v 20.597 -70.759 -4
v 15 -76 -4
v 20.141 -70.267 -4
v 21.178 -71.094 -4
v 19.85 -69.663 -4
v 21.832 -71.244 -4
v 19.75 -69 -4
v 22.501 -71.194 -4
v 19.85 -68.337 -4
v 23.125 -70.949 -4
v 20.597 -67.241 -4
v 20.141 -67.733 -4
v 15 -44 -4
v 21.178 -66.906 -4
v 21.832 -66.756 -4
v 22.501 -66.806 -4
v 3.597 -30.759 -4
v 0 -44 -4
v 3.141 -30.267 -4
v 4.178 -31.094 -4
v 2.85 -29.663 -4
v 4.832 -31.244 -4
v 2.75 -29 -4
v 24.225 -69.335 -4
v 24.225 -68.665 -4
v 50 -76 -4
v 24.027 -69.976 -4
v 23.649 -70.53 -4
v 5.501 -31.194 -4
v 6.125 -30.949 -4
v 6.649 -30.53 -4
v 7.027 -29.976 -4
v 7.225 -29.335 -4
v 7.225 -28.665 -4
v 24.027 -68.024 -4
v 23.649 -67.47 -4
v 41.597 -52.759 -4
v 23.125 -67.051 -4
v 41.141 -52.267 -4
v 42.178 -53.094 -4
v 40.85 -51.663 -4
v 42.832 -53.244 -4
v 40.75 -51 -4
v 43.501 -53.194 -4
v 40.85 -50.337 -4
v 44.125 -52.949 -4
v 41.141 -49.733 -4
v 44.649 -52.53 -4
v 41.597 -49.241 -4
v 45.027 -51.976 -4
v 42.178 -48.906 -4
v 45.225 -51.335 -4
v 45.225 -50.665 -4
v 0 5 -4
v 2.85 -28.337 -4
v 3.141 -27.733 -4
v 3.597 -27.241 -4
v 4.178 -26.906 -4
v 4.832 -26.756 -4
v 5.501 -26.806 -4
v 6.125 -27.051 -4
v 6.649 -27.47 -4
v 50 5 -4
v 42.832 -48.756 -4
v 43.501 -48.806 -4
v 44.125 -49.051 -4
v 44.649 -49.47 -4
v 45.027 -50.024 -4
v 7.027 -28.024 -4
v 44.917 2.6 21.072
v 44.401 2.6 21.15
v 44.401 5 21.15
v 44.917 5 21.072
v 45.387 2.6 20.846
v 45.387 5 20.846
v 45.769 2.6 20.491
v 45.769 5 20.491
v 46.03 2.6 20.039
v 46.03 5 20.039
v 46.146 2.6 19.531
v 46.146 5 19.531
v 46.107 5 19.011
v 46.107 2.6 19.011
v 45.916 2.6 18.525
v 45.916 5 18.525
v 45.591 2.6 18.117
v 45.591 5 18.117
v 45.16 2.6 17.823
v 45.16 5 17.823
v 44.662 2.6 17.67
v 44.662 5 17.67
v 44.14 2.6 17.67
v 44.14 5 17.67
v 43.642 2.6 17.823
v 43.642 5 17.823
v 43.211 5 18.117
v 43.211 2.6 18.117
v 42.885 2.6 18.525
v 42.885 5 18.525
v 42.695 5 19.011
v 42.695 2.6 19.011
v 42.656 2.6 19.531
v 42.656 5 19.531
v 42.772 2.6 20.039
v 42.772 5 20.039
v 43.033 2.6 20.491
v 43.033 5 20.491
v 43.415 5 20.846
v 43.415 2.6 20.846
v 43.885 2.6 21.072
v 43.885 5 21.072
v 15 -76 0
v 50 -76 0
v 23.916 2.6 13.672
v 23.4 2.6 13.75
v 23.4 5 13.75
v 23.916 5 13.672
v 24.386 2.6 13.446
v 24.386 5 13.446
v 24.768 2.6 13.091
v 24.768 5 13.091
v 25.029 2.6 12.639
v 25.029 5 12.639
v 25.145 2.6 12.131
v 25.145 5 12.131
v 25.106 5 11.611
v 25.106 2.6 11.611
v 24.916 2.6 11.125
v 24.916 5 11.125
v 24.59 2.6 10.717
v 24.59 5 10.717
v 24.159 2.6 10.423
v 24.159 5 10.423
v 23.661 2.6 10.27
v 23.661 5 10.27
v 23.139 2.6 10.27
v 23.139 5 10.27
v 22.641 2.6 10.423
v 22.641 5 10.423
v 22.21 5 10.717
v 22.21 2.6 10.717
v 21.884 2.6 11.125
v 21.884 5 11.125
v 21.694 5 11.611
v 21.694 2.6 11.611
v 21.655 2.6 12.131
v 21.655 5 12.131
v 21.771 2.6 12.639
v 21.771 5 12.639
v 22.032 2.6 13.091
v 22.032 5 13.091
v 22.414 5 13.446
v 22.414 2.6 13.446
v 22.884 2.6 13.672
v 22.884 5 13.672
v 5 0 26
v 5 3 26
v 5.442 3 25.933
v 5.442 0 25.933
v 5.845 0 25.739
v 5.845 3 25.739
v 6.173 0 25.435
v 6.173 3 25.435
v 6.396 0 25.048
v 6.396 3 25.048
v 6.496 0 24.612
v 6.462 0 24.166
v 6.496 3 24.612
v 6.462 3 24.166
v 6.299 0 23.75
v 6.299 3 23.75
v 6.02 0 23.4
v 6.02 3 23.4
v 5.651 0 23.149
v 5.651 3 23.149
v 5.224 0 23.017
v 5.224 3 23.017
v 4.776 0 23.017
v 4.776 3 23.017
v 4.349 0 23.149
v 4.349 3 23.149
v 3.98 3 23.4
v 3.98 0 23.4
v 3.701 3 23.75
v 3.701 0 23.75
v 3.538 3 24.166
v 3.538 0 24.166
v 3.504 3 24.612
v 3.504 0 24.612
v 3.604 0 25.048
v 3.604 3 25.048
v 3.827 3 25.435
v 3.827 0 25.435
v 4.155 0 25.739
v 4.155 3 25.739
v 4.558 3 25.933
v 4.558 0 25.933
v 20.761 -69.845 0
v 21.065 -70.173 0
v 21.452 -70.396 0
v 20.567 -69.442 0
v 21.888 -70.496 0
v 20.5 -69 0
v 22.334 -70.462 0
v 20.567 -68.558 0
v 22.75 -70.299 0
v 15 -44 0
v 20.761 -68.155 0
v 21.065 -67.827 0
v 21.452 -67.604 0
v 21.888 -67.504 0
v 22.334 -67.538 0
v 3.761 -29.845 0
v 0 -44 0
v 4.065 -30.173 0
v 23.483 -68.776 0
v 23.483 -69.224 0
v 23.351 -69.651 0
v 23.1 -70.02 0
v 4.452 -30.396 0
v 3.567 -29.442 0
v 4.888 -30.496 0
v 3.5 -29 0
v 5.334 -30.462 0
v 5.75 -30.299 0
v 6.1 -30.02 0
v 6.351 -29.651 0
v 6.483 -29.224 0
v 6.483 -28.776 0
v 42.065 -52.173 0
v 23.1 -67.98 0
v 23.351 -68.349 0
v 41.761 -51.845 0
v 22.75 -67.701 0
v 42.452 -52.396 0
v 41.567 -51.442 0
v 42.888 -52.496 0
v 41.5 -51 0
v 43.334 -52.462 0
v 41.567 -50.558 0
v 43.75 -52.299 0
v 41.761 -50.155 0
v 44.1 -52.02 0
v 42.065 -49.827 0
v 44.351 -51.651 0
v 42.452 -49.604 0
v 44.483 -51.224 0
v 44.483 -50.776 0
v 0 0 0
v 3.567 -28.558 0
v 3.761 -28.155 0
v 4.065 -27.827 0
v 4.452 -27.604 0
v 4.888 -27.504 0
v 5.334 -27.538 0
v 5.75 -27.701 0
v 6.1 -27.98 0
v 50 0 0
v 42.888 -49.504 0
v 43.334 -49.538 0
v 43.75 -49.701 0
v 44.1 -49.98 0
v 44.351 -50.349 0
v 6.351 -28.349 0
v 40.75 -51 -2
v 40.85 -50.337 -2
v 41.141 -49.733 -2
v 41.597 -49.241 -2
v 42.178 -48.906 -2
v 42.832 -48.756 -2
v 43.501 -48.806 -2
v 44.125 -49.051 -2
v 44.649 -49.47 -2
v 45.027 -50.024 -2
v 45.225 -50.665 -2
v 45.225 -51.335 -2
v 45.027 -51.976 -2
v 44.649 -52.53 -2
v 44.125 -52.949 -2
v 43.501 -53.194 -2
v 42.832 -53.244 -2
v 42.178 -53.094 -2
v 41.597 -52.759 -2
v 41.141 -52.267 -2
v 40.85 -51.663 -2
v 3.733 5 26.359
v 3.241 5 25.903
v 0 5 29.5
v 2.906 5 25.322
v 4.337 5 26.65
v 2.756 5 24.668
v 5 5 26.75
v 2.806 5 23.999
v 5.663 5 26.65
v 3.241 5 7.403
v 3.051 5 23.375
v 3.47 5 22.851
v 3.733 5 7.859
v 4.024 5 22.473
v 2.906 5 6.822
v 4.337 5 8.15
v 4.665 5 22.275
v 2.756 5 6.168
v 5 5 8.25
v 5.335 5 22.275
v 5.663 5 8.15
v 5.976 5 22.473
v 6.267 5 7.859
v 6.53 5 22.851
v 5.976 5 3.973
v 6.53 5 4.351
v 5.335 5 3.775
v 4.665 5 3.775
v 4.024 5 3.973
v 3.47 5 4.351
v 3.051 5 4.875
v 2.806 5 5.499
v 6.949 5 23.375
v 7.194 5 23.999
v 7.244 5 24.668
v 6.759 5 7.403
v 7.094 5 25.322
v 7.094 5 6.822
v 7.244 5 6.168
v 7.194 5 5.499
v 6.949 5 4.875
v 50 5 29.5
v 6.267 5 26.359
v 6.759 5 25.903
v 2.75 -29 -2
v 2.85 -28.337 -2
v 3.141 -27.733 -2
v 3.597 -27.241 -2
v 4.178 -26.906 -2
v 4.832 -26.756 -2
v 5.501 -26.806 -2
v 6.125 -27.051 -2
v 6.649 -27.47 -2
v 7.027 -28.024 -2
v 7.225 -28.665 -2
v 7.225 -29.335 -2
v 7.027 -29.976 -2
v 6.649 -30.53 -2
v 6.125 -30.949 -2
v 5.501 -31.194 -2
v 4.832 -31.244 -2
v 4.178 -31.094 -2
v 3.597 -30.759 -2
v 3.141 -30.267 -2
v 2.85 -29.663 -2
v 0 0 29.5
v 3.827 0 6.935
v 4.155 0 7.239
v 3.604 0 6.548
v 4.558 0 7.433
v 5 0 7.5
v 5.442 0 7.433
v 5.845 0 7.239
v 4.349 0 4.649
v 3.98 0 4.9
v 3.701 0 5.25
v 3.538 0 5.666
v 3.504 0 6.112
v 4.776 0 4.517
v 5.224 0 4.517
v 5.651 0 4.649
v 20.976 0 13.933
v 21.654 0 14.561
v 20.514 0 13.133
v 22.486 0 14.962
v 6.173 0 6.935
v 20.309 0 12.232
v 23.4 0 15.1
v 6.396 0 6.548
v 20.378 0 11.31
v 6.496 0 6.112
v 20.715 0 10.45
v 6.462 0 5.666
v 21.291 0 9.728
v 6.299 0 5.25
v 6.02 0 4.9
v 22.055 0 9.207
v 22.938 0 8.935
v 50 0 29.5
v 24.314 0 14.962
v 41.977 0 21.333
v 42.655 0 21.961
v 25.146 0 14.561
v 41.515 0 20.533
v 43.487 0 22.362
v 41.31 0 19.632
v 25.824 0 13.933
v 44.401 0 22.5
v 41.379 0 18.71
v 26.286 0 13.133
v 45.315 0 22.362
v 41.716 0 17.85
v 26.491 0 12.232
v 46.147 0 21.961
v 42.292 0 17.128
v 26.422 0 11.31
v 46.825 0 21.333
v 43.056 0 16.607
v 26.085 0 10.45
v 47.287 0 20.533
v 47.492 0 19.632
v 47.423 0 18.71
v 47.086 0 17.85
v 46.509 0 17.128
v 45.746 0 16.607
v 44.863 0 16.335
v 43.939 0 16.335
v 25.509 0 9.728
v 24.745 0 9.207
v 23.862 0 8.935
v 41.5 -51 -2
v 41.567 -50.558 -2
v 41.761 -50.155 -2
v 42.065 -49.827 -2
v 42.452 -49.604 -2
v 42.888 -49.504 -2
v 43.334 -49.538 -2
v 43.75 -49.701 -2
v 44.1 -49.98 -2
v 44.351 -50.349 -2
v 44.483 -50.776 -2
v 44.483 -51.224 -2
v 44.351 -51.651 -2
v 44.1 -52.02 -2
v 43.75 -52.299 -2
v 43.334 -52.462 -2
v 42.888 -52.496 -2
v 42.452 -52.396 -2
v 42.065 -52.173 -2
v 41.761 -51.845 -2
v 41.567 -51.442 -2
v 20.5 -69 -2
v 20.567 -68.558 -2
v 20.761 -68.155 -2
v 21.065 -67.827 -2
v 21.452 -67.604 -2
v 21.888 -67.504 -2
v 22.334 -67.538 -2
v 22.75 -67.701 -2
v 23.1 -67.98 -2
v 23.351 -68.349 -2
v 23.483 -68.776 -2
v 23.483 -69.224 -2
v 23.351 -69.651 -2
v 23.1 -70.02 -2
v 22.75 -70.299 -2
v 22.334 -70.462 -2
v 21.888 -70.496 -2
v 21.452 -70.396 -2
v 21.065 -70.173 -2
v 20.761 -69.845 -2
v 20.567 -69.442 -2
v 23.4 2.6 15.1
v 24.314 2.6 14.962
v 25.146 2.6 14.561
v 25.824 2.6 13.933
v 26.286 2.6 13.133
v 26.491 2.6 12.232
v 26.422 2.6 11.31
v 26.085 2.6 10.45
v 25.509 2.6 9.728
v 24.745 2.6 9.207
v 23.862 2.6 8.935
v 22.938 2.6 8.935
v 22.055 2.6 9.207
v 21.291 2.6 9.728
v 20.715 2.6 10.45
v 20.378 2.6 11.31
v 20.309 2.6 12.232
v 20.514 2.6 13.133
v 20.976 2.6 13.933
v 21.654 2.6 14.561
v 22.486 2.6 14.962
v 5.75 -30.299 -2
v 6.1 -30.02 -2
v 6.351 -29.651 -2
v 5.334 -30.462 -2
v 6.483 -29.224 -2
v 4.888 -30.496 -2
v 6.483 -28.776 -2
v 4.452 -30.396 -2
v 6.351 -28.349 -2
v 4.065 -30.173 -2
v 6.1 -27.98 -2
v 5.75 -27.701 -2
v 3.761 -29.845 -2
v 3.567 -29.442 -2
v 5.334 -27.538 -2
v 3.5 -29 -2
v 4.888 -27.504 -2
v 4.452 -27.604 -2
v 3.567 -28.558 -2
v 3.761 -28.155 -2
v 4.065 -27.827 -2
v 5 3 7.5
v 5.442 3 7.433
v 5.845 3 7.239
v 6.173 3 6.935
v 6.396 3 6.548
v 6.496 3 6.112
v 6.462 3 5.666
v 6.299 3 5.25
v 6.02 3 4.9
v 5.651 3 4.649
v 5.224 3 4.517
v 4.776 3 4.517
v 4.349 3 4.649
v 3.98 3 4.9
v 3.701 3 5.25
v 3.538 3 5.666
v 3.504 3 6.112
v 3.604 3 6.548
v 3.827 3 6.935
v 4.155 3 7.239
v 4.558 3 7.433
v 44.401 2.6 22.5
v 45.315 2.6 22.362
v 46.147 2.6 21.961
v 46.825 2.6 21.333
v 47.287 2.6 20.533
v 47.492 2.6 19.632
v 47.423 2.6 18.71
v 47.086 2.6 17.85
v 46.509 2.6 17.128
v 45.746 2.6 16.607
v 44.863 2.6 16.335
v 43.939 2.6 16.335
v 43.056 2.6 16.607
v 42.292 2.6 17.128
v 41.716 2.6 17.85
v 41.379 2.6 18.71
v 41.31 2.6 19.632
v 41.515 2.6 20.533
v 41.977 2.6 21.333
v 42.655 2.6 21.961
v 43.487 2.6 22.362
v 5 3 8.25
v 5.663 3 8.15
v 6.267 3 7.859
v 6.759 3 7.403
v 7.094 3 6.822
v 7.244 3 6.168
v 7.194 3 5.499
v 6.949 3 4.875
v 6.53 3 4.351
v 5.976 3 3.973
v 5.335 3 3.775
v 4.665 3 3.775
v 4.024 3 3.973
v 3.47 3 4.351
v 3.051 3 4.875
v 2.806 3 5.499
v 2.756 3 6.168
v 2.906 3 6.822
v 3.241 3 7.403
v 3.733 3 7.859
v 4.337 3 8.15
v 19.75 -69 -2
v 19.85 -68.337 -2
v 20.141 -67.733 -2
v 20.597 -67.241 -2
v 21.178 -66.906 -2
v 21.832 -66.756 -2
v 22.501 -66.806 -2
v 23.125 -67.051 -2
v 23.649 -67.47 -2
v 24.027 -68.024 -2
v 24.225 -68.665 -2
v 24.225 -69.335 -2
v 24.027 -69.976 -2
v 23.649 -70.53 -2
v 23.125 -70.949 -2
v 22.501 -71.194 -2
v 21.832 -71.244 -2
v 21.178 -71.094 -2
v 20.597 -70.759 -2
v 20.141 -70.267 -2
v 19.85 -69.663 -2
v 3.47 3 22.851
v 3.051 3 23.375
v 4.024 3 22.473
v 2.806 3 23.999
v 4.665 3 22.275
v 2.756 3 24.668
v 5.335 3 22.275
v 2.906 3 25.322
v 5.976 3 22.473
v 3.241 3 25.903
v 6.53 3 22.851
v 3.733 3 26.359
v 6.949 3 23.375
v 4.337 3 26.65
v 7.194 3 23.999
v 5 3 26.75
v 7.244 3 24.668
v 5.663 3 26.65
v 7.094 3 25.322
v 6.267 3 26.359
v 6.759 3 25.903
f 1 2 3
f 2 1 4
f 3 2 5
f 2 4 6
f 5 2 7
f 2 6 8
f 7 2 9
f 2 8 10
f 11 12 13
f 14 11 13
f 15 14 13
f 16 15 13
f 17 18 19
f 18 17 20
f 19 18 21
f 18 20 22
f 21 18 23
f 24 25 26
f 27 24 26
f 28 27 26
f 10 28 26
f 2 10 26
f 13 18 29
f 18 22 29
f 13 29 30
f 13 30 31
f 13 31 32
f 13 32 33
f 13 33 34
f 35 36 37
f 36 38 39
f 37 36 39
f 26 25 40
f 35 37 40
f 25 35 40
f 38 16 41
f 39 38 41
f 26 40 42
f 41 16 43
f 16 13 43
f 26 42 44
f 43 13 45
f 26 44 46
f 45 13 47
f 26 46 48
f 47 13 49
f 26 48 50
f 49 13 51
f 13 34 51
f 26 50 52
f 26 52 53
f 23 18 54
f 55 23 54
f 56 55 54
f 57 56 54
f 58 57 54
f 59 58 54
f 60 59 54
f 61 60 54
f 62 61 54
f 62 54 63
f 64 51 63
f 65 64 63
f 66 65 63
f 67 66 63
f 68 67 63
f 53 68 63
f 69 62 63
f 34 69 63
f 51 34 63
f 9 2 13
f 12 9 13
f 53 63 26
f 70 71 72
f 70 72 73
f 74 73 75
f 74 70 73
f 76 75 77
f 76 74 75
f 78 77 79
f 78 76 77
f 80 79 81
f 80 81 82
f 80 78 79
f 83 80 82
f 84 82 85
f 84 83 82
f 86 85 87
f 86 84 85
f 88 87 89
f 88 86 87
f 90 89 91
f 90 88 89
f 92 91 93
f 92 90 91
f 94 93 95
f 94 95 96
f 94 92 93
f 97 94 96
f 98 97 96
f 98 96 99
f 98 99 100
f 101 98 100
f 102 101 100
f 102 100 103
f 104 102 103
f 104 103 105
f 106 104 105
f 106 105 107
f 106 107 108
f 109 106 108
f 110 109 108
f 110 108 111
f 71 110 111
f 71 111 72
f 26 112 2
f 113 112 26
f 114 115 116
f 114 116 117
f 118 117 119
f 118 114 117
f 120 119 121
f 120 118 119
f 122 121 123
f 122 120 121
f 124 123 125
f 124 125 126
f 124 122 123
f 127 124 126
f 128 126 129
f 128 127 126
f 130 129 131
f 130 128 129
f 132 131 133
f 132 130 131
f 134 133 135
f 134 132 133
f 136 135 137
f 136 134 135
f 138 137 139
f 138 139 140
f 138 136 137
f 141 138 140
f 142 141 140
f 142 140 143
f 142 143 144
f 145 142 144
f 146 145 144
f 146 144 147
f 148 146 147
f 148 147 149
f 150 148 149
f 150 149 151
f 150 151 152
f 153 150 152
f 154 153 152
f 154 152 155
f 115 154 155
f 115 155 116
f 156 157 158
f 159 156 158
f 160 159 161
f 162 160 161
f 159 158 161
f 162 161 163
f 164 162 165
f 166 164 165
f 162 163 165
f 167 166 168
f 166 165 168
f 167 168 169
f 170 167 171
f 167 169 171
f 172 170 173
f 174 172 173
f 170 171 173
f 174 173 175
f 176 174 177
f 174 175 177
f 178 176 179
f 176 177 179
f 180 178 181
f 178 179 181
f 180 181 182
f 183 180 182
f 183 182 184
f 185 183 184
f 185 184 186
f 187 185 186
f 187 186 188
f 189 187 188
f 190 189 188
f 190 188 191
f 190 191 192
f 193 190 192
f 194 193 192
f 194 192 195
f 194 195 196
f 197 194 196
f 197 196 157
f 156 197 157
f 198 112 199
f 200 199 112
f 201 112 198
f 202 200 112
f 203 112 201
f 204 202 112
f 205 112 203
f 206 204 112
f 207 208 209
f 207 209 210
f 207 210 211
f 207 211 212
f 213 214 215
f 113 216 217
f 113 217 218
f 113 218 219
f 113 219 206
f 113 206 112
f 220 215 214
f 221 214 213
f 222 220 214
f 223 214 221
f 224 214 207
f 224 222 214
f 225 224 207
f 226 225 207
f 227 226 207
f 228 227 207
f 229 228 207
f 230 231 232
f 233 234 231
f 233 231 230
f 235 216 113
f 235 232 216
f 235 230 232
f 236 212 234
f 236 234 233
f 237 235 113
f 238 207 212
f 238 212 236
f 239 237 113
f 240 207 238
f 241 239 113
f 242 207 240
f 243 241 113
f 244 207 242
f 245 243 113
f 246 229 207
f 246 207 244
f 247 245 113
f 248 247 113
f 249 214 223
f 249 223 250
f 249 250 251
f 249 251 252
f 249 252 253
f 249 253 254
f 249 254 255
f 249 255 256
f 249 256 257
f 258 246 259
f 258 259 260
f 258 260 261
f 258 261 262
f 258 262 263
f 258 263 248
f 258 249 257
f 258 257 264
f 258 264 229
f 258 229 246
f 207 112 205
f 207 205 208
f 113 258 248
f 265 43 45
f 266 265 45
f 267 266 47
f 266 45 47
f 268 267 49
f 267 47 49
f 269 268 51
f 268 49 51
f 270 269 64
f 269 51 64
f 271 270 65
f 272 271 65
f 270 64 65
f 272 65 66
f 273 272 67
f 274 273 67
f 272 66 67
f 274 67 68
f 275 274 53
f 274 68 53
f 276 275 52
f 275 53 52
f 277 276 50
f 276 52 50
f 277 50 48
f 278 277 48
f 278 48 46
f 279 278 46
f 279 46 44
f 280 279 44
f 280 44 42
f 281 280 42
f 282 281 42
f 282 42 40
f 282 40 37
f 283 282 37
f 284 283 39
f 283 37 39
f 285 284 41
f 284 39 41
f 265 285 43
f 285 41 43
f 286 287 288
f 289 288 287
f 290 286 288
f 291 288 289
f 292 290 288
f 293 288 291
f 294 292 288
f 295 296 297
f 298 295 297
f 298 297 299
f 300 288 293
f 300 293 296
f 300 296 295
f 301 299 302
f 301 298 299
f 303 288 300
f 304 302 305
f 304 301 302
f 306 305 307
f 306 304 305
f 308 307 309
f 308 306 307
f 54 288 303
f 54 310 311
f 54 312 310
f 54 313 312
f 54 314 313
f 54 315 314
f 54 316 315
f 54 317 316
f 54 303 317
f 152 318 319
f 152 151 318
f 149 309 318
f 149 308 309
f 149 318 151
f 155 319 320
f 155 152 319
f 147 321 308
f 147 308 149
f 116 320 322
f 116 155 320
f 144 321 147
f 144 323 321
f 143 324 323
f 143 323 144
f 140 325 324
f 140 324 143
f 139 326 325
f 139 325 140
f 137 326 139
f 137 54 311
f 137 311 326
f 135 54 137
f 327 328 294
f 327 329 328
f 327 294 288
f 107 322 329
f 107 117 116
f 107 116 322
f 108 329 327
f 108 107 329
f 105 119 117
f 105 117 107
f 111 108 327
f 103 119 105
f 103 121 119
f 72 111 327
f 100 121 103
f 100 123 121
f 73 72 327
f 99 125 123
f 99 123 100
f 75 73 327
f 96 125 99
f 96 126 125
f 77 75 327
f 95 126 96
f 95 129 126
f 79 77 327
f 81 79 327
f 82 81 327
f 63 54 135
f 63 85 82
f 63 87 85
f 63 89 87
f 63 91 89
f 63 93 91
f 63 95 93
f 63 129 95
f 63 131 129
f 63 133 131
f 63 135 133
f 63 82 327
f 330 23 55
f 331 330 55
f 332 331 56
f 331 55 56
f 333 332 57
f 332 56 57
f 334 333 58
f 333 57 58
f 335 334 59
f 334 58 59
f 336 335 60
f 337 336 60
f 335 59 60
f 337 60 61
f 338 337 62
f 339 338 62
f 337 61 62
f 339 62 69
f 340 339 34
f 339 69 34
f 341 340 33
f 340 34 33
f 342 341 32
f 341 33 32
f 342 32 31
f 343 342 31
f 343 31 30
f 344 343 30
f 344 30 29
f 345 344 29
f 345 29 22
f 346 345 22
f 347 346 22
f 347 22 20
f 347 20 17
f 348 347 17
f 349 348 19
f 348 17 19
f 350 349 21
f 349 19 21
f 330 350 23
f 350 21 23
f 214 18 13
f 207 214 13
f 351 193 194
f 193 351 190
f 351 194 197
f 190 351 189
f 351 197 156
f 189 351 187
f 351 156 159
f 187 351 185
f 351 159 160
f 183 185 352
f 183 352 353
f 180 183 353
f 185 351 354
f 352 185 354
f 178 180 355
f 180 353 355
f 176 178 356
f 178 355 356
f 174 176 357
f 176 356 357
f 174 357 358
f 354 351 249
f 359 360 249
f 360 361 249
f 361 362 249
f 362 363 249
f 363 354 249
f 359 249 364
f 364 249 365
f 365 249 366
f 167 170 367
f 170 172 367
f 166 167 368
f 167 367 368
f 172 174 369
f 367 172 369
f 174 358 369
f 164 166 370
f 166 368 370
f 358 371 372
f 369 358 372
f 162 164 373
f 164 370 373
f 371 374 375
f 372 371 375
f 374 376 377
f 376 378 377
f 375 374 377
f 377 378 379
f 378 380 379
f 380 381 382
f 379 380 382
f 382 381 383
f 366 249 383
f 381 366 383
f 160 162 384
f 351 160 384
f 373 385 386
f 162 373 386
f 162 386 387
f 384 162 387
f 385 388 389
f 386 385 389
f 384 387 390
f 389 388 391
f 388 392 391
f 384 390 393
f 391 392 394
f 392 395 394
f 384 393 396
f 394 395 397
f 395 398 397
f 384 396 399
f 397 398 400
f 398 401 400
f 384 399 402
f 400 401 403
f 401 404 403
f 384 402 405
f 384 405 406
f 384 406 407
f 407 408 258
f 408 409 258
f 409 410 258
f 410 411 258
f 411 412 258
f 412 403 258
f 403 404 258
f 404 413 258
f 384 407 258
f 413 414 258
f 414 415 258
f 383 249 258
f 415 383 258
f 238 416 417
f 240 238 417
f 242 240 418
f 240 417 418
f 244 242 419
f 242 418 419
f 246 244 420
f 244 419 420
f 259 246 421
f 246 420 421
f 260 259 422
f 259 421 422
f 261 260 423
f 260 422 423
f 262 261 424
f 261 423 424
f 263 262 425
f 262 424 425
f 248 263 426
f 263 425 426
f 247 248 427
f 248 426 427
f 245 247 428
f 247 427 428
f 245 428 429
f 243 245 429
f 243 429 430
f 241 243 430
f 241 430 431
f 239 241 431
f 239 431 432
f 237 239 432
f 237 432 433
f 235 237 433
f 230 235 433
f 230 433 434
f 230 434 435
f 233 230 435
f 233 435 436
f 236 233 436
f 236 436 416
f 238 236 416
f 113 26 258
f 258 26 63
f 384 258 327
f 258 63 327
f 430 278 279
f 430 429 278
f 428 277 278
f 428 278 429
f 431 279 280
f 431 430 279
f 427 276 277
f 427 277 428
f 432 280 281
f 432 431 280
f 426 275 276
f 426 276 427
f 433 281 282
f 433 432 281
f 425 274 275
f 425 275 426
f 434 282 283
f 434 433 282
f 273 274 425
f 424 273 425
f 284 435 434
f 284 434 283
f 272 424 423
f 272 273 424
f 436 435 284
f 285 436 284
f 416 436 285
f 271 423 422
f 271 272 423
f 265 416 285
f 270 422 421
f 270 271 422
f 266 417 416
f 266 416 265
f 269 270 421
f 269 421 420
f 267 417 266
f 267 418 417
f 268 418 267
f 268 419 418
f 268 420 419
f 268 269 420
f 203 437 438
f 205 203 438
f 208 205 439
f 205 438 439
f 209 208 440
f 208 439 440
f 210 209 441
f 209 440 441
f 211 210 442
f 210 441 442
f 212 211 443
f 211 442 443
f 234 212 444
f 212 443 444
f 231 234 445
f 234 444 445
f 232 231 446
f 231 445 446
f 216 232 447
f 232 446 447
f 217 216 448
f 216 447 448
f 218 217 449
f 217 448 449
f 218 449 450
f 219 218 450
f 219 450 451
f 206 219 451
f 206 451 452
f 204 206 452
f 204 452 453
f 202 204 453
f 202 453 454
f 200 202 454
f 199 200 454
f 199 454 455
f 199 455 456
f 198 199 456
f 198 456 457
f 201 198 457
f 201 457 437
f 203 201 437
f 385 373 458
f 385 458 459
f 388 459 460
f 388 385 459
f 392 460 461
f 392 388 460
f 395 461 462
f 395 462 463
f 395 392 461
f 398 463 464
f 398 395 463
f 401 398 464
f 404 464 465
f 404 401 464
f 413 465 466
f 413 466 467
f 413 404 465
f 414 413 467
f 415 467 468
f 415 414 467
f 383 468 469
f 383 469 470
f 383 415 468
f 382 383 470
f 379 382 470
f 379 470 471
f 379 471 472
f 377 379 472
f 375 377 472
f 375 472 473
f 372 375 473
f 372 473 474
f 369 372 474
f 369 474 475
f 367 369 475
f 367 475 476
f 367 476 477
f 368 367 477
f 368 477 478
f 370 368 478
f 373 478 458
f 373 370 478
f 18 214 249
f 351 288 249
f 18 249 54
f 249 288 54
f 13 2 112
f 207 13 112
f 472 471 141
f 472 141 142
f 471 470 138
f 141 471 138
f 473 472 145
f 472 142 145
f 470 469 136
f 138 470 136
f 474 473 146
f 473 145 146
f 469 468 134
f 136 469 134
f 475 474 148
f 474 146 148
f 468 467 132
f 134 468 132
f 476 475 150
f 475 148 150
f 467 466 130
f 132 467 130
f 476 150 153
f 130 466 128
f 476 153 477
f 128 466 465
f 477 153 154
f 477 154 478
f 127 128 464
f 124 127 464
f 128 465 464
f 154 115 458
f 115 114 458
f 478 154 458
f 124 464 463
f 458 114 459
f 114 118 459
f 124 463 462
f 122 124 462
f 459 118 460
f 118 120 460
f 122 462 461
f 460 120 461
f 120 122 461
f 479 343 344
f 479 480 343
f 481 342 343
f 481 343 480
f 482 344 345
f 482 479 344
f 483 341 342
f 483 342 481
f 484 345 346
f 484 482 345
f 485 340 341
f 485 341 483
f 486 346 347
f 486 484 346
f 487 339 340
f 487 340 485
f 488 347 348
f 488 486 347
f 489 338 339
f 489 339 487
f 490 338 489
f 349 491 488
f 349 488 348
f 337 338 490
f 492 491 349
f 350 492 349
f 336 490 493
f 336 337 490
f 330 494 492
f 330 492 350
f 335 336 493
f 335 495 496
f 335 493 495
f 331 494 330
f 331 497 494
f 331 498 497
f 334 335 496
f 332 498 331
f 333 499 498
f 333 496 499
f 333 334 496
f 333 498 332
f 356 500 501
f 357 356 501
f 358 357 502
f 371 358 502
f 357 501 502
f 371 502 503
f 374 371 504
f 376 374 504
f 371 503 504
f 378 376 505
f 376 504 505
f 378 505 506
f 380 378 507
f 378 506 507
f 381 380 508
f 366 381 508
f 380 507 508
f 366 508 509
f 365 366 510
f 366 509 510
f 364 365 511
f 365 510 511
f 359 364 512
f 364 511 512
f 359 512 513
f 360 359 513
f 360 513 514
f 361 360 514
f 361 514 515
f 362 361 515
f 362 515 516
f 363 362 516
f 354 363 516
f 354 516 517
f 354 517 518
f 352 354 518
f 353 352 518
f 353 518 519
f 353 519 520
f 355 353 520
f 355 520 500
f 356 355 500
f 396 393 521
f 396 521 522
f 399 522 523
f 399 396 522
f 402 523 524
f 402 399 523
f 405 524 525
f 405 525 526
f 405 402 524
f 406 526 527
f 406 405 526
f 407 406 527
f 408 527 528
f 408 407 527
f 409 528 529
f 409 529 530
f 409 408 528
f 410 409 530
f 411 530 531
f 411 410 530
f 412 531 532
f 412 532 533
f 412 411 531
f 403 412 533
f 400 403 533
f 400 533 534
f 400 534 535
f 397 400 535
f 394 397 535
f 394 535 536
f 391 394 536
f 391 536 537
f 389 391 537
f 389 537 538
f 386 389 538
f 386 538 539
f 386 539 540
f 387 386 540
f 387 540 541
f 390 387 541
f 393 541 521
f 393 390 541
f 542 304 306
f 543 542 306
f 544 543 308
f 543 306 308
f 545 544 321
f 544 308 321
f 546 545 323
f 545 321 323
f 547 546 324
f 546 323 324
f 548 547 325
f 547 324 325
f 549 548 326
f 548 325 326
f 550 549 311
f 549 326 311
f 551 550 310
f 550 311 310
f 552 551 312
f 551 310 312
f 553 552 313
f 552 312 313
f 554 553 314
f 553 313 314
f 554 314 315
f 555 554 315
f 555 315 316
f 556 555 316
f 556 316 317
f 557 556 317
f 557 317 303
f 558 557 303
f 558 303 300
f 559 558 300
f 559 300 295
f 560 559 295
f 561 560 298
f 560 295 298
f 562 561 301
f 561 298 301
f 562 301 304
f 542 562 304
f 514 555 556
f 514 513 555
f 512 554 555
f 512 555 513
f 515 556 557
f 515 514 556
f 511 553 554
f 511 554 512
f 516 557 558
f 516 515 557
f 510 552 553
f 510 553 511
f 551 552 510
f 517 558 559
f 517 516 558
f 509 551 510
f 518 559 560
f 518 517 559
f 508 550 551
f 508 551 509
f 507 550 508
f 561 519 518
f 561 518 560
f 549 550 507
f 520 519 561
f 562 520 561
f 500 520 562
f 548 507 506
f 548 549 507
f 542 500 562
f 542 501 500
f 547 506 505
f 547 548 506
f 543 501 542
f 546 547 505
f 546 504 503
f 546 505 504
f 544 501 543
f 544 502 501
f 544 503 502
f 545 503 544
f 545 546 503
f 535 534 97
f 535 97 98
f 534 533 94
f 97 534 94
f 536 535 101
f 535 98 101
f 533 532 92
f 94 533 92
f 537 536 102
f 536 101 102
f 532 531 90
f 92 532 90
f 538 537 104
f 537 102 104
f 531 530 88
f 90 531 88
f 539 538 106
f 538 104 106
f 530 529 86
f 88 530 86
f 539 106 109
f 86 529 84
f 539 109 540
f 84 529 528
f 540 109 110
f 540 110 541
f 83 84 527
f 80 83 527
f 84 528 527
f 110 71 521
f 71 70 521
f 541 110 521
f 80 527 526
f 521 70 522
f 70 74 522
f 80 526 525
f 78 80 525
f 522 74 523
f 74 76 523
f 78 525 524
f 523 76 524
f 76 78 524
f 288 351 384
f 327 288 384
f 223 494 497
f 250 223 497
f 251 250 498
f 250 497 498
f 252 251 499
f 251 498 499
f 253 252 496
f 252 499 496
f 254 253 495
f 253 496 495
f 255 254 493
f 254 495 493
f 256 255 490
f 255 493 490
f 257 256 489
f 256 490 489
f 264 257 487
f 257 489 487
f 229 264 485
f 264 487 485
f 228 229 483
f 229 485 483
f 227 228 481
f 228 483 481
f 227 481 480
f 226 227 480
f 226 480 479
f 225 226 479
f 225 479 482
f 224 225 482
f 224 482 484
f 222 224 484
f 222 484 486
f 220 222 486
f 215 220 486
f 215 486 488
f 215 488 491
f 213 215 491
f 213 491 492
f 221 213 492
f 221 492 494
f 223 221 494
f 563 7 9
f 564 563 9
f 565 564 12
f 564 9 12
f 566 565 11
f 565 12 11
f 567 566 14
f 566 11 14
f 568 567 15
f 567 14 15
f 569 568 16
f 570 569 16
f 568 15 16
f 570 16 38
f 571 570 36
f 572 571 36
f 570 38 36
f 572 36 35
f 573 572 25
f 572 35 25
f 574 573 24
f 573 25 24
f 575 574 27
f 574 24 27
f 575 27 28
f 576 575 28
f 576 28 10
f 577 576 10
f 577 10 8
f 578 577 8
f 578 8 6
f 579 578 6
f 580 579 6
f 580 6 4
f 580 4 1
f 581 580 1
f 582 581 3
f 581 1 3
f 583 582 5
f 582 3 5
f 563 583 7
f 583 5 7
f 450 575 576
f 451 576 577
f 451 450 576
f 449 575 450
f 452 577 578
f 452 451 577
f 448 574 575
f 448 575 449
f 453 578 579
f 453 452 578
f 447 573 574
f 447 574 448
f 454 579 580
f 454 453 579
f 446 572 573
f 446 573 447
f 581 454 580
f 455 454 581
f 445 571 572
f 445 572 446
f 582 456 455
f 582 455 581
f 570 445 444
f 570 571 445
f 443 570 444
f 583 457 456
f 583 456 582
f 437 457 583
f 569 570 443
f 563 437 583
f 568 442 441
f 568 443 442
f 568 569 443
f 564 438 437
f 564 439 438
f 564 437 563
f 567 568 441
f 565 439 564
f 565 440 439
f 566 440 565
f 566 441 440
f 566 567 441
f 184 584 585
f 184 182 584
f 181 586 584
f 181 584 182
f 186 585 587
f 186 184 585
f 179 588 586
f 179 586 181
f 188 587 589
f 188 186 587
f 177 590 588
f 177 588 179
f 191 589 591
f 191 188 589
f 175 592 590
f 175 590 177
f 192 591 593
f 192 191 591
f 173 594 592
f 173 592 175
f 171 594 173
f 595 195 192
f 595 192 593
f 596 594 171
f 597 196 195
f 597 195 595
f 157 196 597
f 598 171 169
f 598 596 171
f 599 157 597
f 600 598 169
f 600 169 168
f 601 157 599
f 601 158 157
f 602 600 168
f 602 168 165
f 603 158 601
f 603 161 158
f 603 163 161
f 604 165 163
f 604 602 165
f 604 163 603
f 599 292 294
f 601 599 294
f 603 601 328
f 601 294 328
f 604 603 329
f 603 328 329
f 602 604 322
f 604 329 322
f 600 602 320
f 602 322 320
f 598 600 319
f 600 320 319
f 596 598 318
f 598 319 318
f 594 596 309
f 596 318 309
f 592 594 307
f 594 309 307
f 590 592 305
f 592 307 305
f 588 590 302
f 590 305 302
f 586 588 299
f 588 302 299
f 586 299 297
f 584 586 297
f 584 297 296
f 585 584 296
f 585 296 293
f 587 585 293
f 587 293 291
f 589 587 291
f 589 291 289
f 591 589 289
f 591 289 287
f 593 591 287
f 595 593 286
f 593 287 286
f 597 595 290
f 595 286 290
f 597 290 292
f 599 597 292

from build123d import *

# Parameters (mm, degrees)
SKETCH_1_W          = 50
SKETCH_1_H          = 29.5
SKETCH_1_R          = 1.75
EXTRUDE_1_DEPTH     = 5
SKETCH_1_17_R       = 3.1
CUT_EXTRUDE_1_DEPTH = 2.6
EXTRUDE_START       = 5
SKETCH_1_18_W       = 50
SKETCH_1_18_H       = 4
SKETCH_1_18_W_2     = 15
EXTRUDE_2_DEPTH     = 49
SKETCH_2_R          = 1.5
CUT_EXTRUDE_2_DEPTH = 76.968743573
SKETCH_2_4_R        = 2.25
CUT_EXTRUDE_3_DEPTH = 2
SKETCH_4_R          = 1.5
CUT_EXTRUDE_4_DEPTH = 75.553671942
SKETCH_4_3_R        = 2.25
CUT_EXTRUDE_5_DEPTH = 2
SKETCH_5_W          = 35
SKETCH_5_H          = 4
EXTRUDE_4_DEPTH     = 32
SKETCH_6_R          = 1.5
CUT_EXTRUDE_6_DEPTH = 97.944571792
SKETCH_6_3_R        = 2.25
CUT_EXTRUDE_7_DEPTH = 2


with BuildPart() as part:
    # 草图1 → 凸台-拉伸1 (new body)
    with BuildSketch(Plane(origin=(0, 0, 0), x_dir=(1, 0, 0), z_dir=(0, 1, 0))):
        with Locations((25, -14.75)):
            Rectangle(SKETCH_1_W, SKETCH_1_H)
        with Locations(Location((23.4, -12, 0), (0, 0, 270))):
            Circle(SKETCH_1_R, mode=Mode.SUBTRACT)
        with Locations(Location((44.400952359, -19.4, 0), (0, 0, 270))):
            Circle(SKETCH_1_R, mode=Mode.SUBTRACT)
    extrude(amount=EXTRUDE_1_DEPTH)

    # 草图1<17> → 切除-拉伸1 (cut)
    with BuildSketch(Plane(origin=(0, 0, 0), x_dir=(1, 0, 0), z_dir=(0, 1, 0))):
        with Locations(Location((23.4, -12, 0), (0, 0, 270))):
            Circle(SKETCH_1_17_R)
        with Locations(Location((44.400952359, -19.4, 0), (0, 0, 270))):
            Circle(SKETCH_1_17_R)
    extrude(amount=CUT_EXTRUDE_1_DEPTH, mode=Mode.SUBTRACT)

    # 草图1<18> → 凸台-拉伸2 (add)
    with BuildSketch(Plane(origin=(0, 0, 0), x_dir=(1, 0, 0), z_dir=(0, 1, 0)).offset(EXTRUDE_START)):
        with Locations((25, 2)):
            Rectangle(SKETCH_1_18_W, SKETCH_1_18_H)
        with Locations((7.5, 2)):
            Rectangle(SKETCH_1_18_W_2, SKETCH_1_18_H)
    extrude(amount=-EXTRUDE_2_DEPTH)

    # 草图2 → 切除-拉伸2 (cut, through all)
    with BuildSketch(Plane(origin=(0, 5, 0), x_dir=(1, 0, 0), z_dir=(0, 1, 0))):
        with Locations(Location((5, -24.5, 0), (0, 0, 270))):
            Circle(SKETCH_2_R)
        with Locations(Location((5, -6, 0), (0, 0, 270))):
            Circle(SKETCH_2_R)
    extrude(amount=-CUT_EXTRUDE_2_DEPTH, mode=Mode.SUBTRACT)

    # 草图2<4> → 切除-拉伸3 (cut)
    with BuildSketch(Plane(origin=(0, 5, 0), x_dir=(1, 0, 0), z_dir=(0, 1, 0))):
        with Locations(Location((5, -24.5, 0), (0, 0, 270))):
            Circle(SKETCH_2_4_R)
        with Locations(Location((5, -6, 0), (0, 0, 270))):
            Circle(SKETCH_2_4_R)
    extrude(amount=-CUT_EXTRUDE_3_DEPTH, mode=Mode.SUBTRACT)

    # 草图4 → 切除-拉伸4 (cut, through all)
    with BuildSketch(Plane(origin=(0, 0, -4), x_dir=(-1, 0, 0), z_dir=(0, 0, -1))):
        with Locations((-5, -29)):
            Circle(SKETCH_4_R)
    extrude(amount=-CUT_EXTRUDE_4_DEPTH, mode=Mode.SUBTRACT)

    # 草图4<3> → 切除-拉伸5 (cut)
    with BuildSketch(Plane(origin=(0, 0, -4), x_dir=(-1, 0, 0), z_dir=(0, 0, -1))):
        with Locations((-5, -29)):
            Circle(SKETCH_4_3_R)
    extrude(amount=-CUT_EXTRUDE_5_DEPTH, mode=Mode.SUBTRACT)

    # 草图5 → 凸台-拉伸4 (add)
    with BuildSketch(Plane.XZ.offset(44)):
        with Locations((32.5, -2)):
            Rectangle(SKETCH_5_W, SKETCH_5_H)
    extrude(amount=EXTRUDE_4_DEPTH)

    # 草图6 → 切除-拉伸6 (cut, through all)
    with BuildSketch(Plane(origin=(0, 0, -4), x_dir=(-1, 0, 0), z_dir=(0, 0, -1))):
        with Locations((-22, -69)):
            Circle(SKETCH_6_R)
        with Locations((-43, -51)):
            Circle(SKETCH_6_R)
    extrude(amount=-CUT_EXTRUDE_6_DEPTH, mode=Mode.SUBTRACT)

    # 草图6<3> → 切除-拉伸7 (cut)
    with BuildSketch(Plane(origin=(0, 0, -4), x_dir=(-1, 0, 0), z_dir=(0, 0, -1))):
        with Locations((-22, -69)):
            Circle(SKETCH_6_3_R)
        with Locations((-43, -51)):
            Circle(SKETCH_6_3_R)
    extrude(amount=-CUT_EXTRUDE_7_DEPTH, mode=Mode.SUBTRACT)


solid = part.part
